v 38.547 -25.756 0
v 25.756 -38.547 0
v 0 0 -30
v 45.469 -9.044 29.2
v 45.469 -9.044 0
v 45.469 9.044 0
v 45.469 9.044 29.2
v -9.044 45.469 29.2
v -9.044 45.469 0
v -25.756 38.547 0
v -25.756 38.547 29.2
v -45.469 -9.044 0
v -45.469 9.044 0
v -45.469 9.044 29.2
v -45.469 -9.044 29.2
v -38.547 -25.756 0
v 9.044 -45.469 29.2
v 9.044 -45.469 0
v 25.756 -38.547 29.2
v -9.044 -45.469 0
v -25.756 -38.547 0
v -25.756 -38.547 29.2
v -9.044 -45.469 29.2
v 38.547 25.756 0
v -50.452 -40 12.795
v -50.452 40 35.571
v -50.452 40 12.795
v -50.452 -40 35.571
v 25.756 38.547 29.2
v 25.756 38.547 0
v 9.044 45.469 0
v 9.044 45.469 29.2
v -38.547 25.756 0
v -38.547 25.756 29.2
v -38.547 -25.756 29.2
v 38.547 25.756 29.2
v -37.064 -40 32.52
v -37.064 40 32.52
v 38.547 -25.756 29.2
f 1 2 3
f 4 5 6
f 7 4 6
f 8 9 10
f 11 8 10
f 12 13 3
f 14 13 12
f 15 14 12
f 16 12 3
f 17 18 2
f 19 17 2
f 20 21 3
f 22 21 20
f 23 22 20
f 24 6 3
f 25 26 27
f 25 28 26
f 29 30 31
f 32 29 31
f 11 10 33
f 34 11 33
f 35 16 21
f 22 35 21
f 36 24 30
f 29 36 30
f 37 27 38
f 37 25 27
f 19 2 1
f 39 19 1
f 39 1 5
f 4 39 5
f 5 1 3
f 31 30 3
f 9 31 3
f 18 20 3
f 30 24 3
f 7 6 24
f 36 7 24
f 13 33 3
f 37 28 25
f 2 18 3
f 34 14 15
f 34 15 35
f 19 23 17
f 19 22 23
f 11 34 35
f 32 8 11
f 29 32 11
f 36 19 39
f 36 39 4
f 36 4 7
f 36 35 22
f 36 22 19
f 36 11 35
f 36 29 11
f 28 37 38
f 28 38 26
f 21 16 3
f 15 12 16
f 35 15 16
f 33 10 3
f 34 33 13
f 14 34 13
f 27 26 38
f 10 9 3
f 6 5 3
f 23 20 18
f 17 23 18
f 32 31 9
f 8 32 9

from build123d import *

# Parameters (mm, degrees)
F4_DEPTH = 29.2
F6_DEPTH = 40


with BuildPart() as f3:
    # F0 (on Top) → F3 section 0
    with BuildSketch(Plane.XY, mode=Mode.PRIVATE) as f3_s0:
        Polygon((-9.044372, -45.469128), (9.044372, -45.469128), (25.756192, -38.546865), (38.546865, -25.756192), (45.469128, -9.044372), (45.469128, 9.044372), (38.546865, 25.756192), (25.756192, 38.546865), (9.044372, 45.469128), (-9.044372, 45.469128), (-25.756192, 38.546865), (-38.546865, 25.756192), (-45.469128, 9.044372), (-45.469128, -9.044372), (-38.546865, -25.756192), (-25.756192, -38.546865), align=None)
    loft([f3_s0.sketch, Vertex(0, 0, -30)])

    # F3_face (on face) → F4 (join)
    with BuildSketch(Plane.XY):
        Polygon((-9.044372, -45.469128), (9.044372, -45.469128), (25.756192, -38.546865), (38.546865, -25.756192), (45.469128, -9.044372), (45.469128, 9.044372), (38.546865, 25.756192), (25.756192, 38.546865), (9.044372, 45.469128), (-9.044372, 45.469128), (-25.756192, 38.546865), (-38.546865, 25.756192), (-45.469128, 9.044372), (-45.469128, -9.044372), (-38.546865, -25.756192), (-25.756192, -38.546865), align=None)
    extrude(amount=F4_DEPTH)


with BuildPart() as f6:
    # F5 (on Front) → F6 (new body, symmetric)
    with BuildSketch(Plane.XZ):
        Polygon((-50.451547, 12.794997), (-37.063923, 32.519545), (-50.451547, 35.571124), align=None)
    extrude(amount=F6_DEPTH, both=True)


solid = Compound([f3.part, f6.part])
